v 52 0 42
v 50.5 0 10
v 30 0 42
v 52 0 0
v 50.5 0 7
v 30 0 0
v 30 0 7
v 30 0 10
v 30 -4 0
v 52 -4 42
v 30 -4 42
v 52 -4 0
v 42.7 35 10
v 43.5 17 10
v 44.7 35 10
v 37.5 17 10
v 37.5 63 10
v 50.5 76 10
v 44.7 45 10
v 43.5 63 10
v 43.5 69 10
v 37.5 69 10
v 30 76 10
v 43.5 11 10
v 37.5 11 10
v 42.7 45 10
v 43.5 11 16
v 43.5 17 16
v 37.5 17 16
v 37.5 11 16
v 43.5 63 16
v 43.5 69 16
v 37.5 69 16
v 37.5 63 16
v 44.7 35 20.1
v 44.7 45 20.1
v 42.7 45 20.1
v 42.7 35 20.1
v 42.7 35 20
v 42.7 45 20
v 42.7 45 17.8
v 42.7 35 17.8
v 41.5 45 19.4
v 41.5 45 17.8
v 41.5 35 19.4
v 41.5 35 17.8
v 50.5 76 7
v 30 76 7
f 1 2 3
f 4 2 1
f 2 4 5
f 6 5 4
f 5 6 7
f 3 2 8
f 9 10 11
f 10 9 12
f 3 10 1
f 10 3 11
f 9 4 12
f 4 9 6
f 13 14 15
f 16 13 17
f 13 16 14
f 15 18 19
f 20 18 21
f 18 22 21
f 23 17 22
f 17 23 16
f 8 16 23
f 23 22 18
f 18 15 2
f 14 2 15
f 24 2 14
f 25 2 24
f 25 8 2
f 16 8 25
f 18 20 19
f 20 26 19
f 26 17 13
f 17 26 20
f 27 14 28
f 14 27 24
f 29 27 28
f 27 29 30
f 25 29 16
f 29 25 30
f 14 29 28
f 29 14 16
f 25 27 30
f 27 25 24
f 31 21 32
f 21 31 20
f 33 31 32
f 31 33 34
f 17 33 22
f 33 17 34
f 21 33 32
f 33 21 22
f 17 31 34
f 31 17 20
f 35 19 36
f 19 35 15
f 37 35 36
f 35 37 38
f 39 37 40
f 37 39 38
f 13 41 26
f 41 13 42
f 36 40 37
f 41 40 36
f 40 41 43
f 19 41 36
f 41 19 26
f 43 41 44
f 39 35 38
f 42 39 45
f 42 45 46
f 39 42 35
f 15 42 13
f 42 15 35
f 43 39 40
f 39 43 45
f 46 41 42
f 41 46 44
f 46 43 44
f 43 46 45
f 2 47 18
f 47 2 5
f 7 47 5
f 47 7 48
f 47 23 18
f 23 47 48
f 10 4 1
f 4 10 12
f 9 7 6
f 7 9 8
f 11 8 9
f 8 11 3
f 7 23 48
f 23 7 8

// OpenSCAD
// Lab Rax generic equipment tray + faceplate (wizard template).
// Faceplate derived from the Pi4 baseline; rack holes follow the four-corner layout of the user-supplied
// 1U blank plate (faceplate_mounting.json): EVERY rack unit gets 4 holes, never a single centre pair.
// The wizard appends override assignments at the end of this file.
// PROPOSED, UNVALIDATED: printed fit, strength and rack clearance are UNKNOWN.
$fn=48;
part="assembly";            // assembly, faceplate, tray, combined, rear_bracket
// Device envelope (mm). Origin of hole coordinates = device front-left corner, seen from above.
dev_w=85; dev_d=56; dev_h=20;
holes=[];                   // [[x,y],...] mounting hole centres
hole_d=2.7;                 // device mounting hole diameter
device_mount="inserts";     // inserts, pegs, clips, straps
standoff=6;                 // device lift above tray floor
insert_pilot=3.2;           // pilot for heat-set insert (inserts mode)
board_t=1.6;                // board/flange thickness (pegs, clips)
joint="screw";              // screw, single ("snap" retired 2026-10-19: too brittle; kept as history)
u=1;                        // faceplate height in rack units
keystones=[];               // [x,...] keystone centres on faceplate (X=0 centre)
// Keystone v2 (2026-10-19): re-modelled from measurements of Brian's reference keystone frame
// (14.5 x 16 opening was too narrow when printed). Opening 14.8 x 16.6 through the plate, plus a rear collar
// 19.8 x 27.85 reaching 9.2 mm behind the front face (bottom lip to 10.4) that carries the latch ramp and catches.
ks_w=14.8; ks_h=16.6;       // front opening
ks_ow=19.8; ks_ob=11.9; ks_ot=15.95; ks_od=9.2; ks_lip=10.4;  // collar width, below/above opening centre, depth
ports=[];                   // [[x,z,w,h,r],...] faceplate cut-outs, z from plate bottom, r=corner radius
front_gap=12;               // device front to faceplate rear face
margin=8;                   // tray border around device
rear_support=false;         // heavy/deep equipment: tray runs to the rear posts and screws to a rear bracket
coupon=[];                  // test coupon: [x0,x1,ymax] keeps only that slice of the part

// 4 mm plate (owner default 2026-10-18). Corner radius is limited by the four-corner holes:
// the reference holes sit 1.6 mm from the top/bottom edge, so larger corners would cut into them.
plate_w=252; plate_t=4; plate_r=2.5; plate_h=u*44.45-2.45;
hole_x=118.2625; hole_dz=15.902;   // each U: holes at its centre ±hole_dz (5.098 / 36.902 on a 1U plate)
rack_depth=240;             // Lab Rax frame depth (front of front posts to back of rear posts)
nudge=0;                    // render-repair only: tiny size offset applied when OpenSCAD 2021 emits a sliver
tray_t=3; tray_z=7;
tray_w=dev_w+2*margin; tray_d=rear_support?rack_depth:dev_d+front_gap+margin;
tray_x=-tray_w/2; tray_y=0;
dev_x=-dev_w/2; dev_y=front_gap; floor_top=tray_z+tray_t;
jx=min(40,tray_w/2-12); joint_x=[-jx,jx];
tongue_w=12; tongue_depth=7; tongue_h=3; tongue_z=tray_z+3.5;
slot_clear=0.3; boss_d=9; m3_clear=3.4; joint_pilot=4.0;  // 4.0 = the printed, well-fitting Pi4 trial

module capsule2d(len=10,diam=7){hull(){translate([-(len-diam)/2,0])circle(d=diam);translate([(len-diam)/2,0])circle(d=diam);}}
module rrect(w,h,r){rr=min(r,w/2-0.01,h/2-0.01);if(rr<=0)square([w,h],center=true);else offset(r=rr)square([w-2*rr,h-2*rr],center=true);}
// Mirror front-of-tray features to the rear (about the rack's mid-depth).
module to_rear(){translate([0,rack_depth/2,0])mirror([0,1,0])translate([0,-rack_depth/2,0])children();}

// Faceplate outline seen from the front: 2D X = rack X, 2D Y = height Z.
// rear=true cuts the larger keystone pocket; plain=true leaves out keystones/ports (rear bracket).
module plate2d(rear=false,plain=false){
 difference(){
  hull()for(sx=[-1,1],sz=[-1,1])translate([sx*(plate_w/2-plate_r),plate_h/2+sz*(plate_h/2-plate_r)])circle(r=plate_r+nudge);
  for(i=[0:u-1],dz=[-hole_dz,hole_dz],x=[-hole_x,hole_x])translate([x,i*44.45+21+dz])capsule2d();
  if(!plain){
   for(p=ports)translate([p[0],p[1]])rrect(p[2],p[3],p[4]);
  }
 }
}
// Plate between y=y0 (front) and y0+t, built from the 2D outline (cleaner meshes than 3D cuts in OpenSCAD 2021).
module plate_layer(y0,t,rear=false,plain=false){translate([0,y0+t,0])rotate([90,0,0])linear_extrude(height=t)plate2d(rear,plain);}

module plate_joint_add(){
 if(joint=="screw"){
  for(x=joint_x)translate([x-tongue_w/2,0,tongue_z])cube([tongue_w,tongue_depth,tongue_h]);
  for(x=joint_x)translate([x,0,tray_z+14])rotate([-90,0,0])cylinder(d=boss_d,h=8);
 }
 if(joint=="snap") for(x=joint_x){
  // Cantilever arm under the tray floor; barb snaps up into a floor window.
  translate([x-4,0,tray_z-2])cube([8,16,2]);
  // Barb v2: square catch face toward the plate, ramp falling toward the rear so the tray, slid in
  // from the rear, cams the arm down until its window drops over the barb.
  translate([x-4,12,tray_z])hull(){cube([8,0.6,1.2]);cube([8,2.4,0.01]);}
 }
}
// Keystone collar behind the plate, and the jack-shaped cut through plate + collar.
// Profile in (d = depth behind front face, z from opening centre); X width is ks_w throughout.
module ks_collar(){for(x=keystones)translate([x-ks_ow/2,-plate_t,plate_h/2]){
 translate([0,0,-ks_ob])cube([ks_ow,ks_od,ks_ob+ks_ot]);
 translate([0,0,-ks_ob])cube([ks_ow,ks_lip,ks_ob-ks_h/2]);
}}
module ks_cut(){for(x=keystones)translate([x-ks_w/2,-plate_t,plate_h/2])rotate([90,0,90])linear_extrude(height=ks_w)
 polygon([[-1,-ks_h/2],[5.8,-ks_h/2],[5.8,-9.9],[9.2,-9.9],[9.2,-ks_h/2],[11,-ks_h/2],[11,11.6],[8.2,11.6],
          [8.2,ks_ot+1],[7.2,ks_ot+1],[7.2,13.6],[0.6,ks_h/2],[-1,ks_h/2]]);}
module plate_joint_cut(){if(joint=="screw")for(x=joint_x)translate([x,-0.1,tray_z+14])rotate([-90,0,0])cylinder(d=joint_pilot,h=8.2);}

module faceplate(){
 difference(){
  union(){
   plate_layer(-plate_t,plate_t);
   ks_collar();
   plate_joint_add();
  }
  plate_joint_cut();
  ks_cut();
 }
}
// Plain plate on the rear posts (mirror of the faceplate, no openings) that the tray's rear end screws/snaps to.
module rear_bracket(){to_rear()difference(){union(){plate_layer(-plate_t,plate_t,false,true);plate_joint_add();}plate_joint_cut();}}

module device_features_add(){
 if(device_mount=="inserts")for(h=holes)translate([dev_x+h[0],dev_y+h[1],floor_top])cylinder(d=max(insert_pilot+3.5,7),h=standoff);
 if(device_mount=="pegs")for(h=holes)translate([dev_x+h[0],dev_y+h[1],floor_top]){
  cylinder(d=hole_d+3,h=standoff);
  translate([0,0,standoff])cylinder(d=hole_d-0.3,h=board_t+0.8);
  translate([0,0,standoff+board_t+0.8])cylinder(d1=hole_d-0.3,d2=hole_d-1,h=0.8);
 }
 if(device_mount=="clips"){
  // Support ledges at the four corners plus a flexing clip on each side.
  for(x=[dev_x-1,dev_x+dev_w-5],y=[dev_y-1,dev_y+dev_d-5])translate([x,y,floor_top])cube([6,6,standoff]);
  for(s=[-1,1])translate([s>0?dev_x+dev_w+0.2:dev_x-2.2,dev_y+dev_d/2-5,floor_top]){
   cube([2,10,standoff+board_t+2.5]);
   translate([s>0?-1.2:2,0,standoff+board_t+0.2])hull(){cube([1.2,10,1.6]);translate([s>0?1.2:0,0,1.6])cube([0.01,10,0.6]);}
  }
 }
}
module device_features_cut(){
 if(device_mount=="inserts")for(h=holes)translate([dev_x+h[0],dev_y+h[1],floor_top+0.01])cylinder(d=insert_pilot,h=standoff+0.1);
 if(device_mount=="straps")for(x=[dev_x-5.5,dev_x+dev_w+2.5],y=[dev_y+dev_d*0.25,dev_y+dev_d*0.75])
  translate([x,y-6,tray_z-0.1])cube([3,12,tray_t+0.2]);
}

module tray_joint_add(){
 if(joint=="screw"){
  for(x=joint_x) translate([x-9,0,tray_z+tray_t])cube([18,8,5]);
  for(x=joint_x)translate([x-7,8.3,tray_z+3])cube([14,3,19]);
  for(x=joint_x) for(side=[-1,1]) translate([x+side*6-1,0,0])
    hull(){translate([0,9,tray_z+2.7])cube([2,2,0.5]);
           translate([0,9,tray_z+8])cube([2,2,0.5]);
           translate([0,20,tray_z+2.7])cube([2,2,0.5]);}
 }
}
module tray_joint_cut(){
 if(joint=="screw"){
  for(x=joint_x)translate([x-(tongue_w+slot_clear)/2,-0.1,tongue_z-slot_clear/2])cube([tongue_w+slot_clear,tongue_depth+slot_clear,tongue_h+slot_clear]);
  for(x=joint_x)translate([x,11.4,tray_z+14])rotate([90,0,0])cylinder(d=m3_clear,h=12);
 }
 if(joint=="snap")for(x=joint_x)translate([x-4.3,11.6,tray_z-0.1])cube([8.6,3.2,tray_t+0.2]);
}

module tray(){
 difference(){
  union(){
   translate([tray_x,tray_y,tray_z])cube([tray_w,tray_d,tray_t]);
   tray_joint_add();
   if(rear_support)to_rear()tray_joint_add();
   device_features_add();
  }
  tray_joint_cut();
  if(rear_support)to_rear()tray_joint_cut();
  device_features_cut();
 }
}

module clip_coupon(){if(len(coupon)==3)intersection(){children();translate([coupon[0],-50,-50])cube([coupon[1]-coupon[0],coupon[2]+50,400]);}else children();}

clip_coupon(){
 if(part=="faceplate")faceplate();
 else if(part=="tray")tray();
 else if(part=="rear_bracket")rear_bracket();
 else if(part=="combined")union(){faceplate();translate([tray_x,-0.01,tray_z])cube([tray_w,0.02+0.01,tray_t]);tray();if(rear_support)rear_bracket();}
 else {color("steelblue")faceplate();color("silver")tray();if(rear_support)color("steelblue")rear_bracket();
  %translate([dev_x,dev_y,floor_top+(device_mount=="inserts"||device_mount=="pegs"||device_mount=="clips"?standoff:0)])cube([dev_w,dev_d,dev_h]);}
}

// ---- coupon overrides: 3_Clip_retention (right-hand side of an 85 x 56 mm board tray)
dev_w=85.0; dev_d=56.0; dev_h=20.0; board_t=1.6; standoff=6.0;
u=1; holes=[]; keystones=[]; ports=[];
device_mount="clips";
joint="single";   // no tray joint features in this slice
coupon=[30, 52, 76];
